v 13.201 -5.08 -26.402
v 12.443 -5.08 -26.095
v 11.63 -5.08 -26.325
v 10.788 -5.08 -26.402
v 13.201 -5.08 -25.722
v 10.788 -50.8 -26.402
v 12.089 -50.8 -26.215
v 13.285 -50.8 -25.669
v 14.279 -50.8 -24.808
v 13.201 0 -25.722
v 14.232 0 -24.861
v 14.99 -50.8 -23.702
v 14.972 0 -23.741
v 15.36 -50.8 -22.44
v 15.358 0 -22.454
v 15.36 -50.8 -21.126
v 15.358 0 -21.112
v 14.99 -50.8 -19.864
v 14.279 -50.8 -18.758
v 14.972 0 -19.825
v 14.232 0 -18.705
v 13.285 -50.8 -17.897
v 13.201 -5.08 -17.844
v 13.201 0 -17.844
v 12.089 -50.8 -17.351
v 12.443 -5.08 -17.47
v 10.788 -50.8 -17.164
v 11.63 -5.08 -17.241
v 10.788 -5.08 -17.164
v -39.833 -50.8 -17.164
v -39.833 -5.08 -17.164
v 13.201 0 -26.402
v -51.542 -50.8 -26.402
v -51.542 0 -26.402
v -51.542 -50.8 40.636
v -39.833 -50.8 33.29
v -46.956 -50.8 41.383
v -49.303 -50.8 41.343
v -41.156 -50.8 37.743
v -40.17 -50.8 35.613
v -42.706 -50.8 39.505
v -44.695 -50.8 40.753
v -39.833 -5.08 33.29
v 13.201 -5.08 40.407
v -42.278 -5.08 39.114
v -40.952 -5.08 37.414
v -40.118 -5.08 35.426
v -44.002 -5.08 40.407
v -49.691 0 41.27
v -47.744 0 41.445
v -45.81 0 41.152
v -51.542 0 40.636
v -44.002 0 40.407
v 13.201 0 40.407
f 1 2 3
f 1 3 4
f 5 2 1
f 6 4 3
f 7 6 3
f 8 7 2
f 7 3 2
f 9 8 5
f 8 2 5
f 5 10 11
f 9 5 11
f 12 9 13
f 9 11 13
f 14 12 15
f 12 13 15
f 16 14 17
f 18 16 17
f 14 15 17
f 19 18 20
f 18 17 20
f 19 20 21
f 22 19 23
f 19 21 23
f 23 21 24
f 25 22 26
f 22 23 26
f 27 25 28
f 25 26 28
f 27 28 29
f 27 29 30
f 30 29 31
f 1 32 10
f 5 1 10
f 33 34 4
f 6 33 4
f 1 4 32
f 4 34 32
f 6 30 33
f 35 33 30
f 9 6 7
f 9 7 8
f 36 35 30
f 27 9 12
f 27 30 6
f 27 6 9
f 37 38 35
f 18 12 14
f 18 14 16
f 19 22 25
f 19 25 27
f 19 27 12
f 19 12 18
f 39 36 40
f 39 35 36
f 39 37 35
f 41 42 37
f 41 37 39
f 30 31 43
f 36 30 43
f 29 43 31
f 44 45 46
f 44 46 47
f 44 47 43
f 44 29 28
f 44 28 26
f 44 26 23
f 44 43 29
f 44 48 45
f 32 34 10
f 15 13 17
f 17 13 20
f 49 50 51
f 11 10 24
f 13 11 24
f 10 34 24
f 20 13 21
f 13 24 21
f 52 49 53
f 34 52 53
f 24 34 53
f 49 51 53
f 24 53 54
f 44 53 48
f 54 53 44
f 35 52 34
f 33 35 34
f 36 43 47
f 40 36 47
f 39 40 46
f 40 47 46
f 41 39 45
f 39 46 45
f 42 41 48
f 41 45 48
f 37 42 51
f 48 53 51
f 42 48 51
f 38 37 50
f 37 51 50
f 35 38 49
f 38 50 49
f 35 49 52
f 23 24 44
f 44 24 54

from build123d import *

# Parameters (mm, degrees)
F1_DEPTH = 50.8
F2_W     = 64.513084
F2_H     = 66.808922
F3_DEPTH = 5.08


with BuildPart() as f1:
    # F0 (on Front) → F1 (new body)
    with BuildSketch(Plane.XZ):
        with BuildLine():
            ThreePointArc((-39.832812, 33.289671), (-43.655486, 40.201062), (-51.541593, 40.636353))
            Line((-51.541593, 40.636353), (-51.541593, -26.402151))
            Line((-51.541593, -26.402151), (-39.832812, -26.402151))
            Line((-39.832812, -26.402151), (-39.832812, -17.163772))
            Line((-39.832812, -17.163772), (-39.832812, 33.289671))
        make_face()
        with BuildLine():
            Line((-39.832812, -17.163772), (-39.832812, -26.402151))
            Line((-39.832812, -26.402151), (10.788094, -26.402151))
            ThreePointArc((10.788094, -26.402151), (15.407284, -21.782962), (10.788094, -17.163772))
            Line((10.788094, -17.163772), (-39.832812, -17.163772))
        make_face()
    extrude(amount=F1_DEPTH)

    # F2 (on Front) → F3 (join)
    with BuildSketch(Plane.XZ):
        with Locations((-19.055465, 7.00231)):
            Rectangle(F2_W, F2_H)
    extrude(amount=F3_DEPTH)


solid = f1.part
